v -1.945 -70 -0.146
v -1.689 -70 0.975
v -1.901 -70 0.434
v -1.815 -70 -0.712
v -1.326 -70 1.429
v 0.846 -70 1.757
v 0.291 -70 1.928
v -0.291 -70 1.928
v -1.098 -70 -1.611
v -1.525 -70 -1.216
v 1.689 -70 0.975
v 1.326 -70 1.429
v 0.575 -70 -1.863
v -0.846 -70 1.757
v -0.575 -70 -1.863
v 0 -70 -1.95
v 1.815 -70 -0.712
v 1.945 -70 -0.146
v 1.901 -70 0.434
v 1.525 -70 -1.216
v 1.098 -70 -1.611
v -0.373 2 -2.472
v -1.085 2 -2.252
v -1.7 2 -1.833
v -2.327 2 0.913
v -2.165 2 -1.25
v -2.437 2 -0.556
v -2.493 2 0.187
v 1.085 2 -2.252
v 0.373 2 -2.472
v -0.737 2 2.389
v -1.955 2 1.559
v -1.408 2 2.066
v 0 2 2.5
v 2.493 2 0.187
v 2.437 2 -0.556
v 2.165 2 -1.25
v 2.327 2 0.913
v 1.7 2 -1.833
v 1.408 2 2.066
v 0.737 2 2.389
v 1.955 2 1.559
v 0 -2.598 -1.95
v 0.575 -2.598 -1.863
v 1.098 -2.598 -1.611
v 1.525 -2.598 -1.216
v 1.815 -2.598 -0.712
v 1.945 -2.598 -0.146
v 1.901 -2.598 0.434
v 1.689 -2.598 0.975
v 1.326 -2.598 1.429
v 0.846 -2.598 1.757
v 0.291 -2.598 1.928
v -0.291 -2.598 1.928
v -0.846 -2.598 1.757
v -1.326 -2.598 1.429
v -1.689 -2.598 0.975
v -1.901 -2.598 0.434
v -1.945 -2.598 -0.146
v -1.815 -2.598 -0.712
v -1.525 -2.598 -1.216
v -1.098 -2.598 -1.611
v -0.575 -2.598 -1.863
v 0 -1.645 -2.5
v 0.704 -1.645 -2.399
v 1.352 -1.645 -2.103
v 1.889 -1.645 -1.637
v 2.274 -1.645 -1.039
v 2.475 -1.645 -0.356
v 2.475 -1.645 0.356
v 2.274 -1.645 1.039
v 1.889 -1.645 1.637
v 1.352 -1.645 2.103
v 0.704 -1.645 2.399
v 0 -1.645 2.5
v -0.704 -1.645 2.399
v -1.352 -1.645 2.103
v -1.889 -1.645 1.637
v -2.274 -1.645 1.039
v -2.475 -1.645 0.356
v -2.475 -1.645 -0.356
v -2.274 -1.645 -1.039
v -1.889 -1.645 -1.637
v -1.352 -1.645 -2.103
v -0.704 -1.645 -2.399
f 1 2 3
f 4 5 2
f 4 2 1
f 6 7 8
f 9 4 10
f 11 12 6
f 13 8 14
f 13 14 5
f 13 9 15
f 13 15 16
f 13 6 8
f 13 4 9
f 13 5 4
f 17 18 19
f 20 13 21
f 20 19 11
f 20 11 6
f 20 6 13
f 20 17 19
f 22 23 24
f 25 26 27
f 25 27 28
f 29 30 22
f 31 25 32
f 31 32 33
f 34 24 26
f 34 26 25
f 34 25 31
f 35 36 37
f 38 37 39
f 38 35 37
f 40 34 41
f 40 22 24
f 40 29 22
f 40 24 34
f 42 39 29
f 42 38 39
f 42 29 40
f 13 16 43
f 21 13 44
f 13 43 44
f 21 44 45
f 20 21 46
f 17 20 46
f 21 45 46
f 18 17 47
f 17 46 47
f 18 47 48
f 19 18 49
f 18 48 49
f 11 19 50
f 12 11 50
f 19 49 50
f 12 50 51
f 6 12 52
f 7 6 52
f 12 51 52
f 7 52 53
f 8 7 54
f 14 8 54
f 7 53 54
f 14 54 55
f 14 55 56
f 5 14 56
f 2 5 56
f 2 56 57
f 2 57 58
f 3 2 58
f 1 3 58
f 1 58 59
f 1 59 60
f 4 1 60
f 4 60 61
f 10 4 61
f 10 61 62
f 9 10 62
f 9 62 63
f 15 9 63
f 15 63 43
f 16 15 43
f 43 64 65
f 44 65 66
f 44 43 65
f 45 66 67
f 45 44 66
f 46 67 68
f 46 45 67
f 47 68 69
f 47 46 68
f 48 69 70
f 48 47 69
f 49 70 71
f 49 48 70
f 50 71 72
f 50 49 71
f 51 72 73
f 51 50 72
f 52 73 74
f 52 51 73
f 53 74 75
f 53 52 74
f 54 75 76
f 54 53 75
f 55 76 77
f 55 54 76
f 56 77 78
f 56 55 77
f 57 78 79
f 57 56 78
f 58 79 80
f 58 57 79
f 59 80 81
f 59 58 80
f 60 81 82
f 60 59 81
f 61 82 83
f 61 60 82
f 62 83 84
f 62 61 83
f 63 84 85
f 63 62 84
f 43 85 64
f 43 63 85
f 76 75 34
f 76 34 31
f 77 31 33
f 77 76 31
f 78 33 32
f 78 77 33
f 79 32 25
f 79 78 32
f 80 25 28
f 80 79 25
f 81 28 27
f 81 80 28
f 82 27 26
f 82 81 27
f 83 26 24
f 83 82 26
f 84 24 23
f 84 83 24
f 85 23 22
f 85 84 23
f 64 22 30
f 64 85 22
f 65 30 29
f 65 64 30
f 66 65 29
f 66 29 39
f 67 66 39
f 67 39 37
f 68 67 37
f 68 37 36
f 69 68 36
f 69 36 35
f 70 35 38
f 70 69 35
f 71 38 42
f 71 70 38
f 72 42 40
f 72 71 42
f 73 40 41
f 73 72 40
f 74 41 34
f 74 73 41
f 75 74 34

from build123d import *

# Parameters (mm, degrees)
SKETCH_1_R       = 2.5
EXTRUDE_1_DEPTH  = 2
SKETCH_2_R       = 1.95
EXTRUDE_2_DEPTH  = 70
CHAMFER_1_SIZE   = 1.5
CHAMFER_1_SIZE_2 = 2.598076211


with BuildPart() as part:
    # 草图1 → 凸台-拉伸1 (new body)
    with BuildSketch(Plane(origin=(0, 0, 0), x_dir=(1, 0, 0), z_dir=(0, 1, 0))):
        with Locations(Location((0, 0, 0), (0, 0, 270))):
            Circle(SKETCH_1_R)
    extrude(amount=EXTRUDE_1_DEPTH)

    # 草图2 → 凸台-拉伸2 (add)
    with BuildSketch(Plane.XZ):
        with Locations(Location((0, 0, 0), (0, 0, 270))):
            Circle(SKETCH_2_R)
    extrude(amount=EXTRUDE_2_DEPTH)

    # 倒角1
    # the kernel refuses this chamfer: 2.598076211, 1.5 mm, written as the material it adds along each edge
    with BuildSketch(Plane(origin=(0, 0, 0), x_dir=(0, 0, -1), z_dir=(-1, 0, 0))) as chamfer_1_piece_1_section:
        Polygon((1.95 + CHAMFER_1_SIZE, 0), (1.95, CHAMFER_1_SIZE_2), (1.95, 0), align=None)
    chamfer_1_piece_1 = revolve(axis=Axis((0, 0, 0), (0, -1, 0)), mode=Mode.PRIVATE)
    chamfer_1_piece_1 = chamfer_1_piece_1 & Plane(origin=(0, -2.153550613, 0), x_dir=(0, 0, 1), z_dir=(0, -1, 0)) * Cylinder(2.5, 14, mode=Mode.PRIVATE)
    add(chamfer_1_piece_1)


solid = part.part
